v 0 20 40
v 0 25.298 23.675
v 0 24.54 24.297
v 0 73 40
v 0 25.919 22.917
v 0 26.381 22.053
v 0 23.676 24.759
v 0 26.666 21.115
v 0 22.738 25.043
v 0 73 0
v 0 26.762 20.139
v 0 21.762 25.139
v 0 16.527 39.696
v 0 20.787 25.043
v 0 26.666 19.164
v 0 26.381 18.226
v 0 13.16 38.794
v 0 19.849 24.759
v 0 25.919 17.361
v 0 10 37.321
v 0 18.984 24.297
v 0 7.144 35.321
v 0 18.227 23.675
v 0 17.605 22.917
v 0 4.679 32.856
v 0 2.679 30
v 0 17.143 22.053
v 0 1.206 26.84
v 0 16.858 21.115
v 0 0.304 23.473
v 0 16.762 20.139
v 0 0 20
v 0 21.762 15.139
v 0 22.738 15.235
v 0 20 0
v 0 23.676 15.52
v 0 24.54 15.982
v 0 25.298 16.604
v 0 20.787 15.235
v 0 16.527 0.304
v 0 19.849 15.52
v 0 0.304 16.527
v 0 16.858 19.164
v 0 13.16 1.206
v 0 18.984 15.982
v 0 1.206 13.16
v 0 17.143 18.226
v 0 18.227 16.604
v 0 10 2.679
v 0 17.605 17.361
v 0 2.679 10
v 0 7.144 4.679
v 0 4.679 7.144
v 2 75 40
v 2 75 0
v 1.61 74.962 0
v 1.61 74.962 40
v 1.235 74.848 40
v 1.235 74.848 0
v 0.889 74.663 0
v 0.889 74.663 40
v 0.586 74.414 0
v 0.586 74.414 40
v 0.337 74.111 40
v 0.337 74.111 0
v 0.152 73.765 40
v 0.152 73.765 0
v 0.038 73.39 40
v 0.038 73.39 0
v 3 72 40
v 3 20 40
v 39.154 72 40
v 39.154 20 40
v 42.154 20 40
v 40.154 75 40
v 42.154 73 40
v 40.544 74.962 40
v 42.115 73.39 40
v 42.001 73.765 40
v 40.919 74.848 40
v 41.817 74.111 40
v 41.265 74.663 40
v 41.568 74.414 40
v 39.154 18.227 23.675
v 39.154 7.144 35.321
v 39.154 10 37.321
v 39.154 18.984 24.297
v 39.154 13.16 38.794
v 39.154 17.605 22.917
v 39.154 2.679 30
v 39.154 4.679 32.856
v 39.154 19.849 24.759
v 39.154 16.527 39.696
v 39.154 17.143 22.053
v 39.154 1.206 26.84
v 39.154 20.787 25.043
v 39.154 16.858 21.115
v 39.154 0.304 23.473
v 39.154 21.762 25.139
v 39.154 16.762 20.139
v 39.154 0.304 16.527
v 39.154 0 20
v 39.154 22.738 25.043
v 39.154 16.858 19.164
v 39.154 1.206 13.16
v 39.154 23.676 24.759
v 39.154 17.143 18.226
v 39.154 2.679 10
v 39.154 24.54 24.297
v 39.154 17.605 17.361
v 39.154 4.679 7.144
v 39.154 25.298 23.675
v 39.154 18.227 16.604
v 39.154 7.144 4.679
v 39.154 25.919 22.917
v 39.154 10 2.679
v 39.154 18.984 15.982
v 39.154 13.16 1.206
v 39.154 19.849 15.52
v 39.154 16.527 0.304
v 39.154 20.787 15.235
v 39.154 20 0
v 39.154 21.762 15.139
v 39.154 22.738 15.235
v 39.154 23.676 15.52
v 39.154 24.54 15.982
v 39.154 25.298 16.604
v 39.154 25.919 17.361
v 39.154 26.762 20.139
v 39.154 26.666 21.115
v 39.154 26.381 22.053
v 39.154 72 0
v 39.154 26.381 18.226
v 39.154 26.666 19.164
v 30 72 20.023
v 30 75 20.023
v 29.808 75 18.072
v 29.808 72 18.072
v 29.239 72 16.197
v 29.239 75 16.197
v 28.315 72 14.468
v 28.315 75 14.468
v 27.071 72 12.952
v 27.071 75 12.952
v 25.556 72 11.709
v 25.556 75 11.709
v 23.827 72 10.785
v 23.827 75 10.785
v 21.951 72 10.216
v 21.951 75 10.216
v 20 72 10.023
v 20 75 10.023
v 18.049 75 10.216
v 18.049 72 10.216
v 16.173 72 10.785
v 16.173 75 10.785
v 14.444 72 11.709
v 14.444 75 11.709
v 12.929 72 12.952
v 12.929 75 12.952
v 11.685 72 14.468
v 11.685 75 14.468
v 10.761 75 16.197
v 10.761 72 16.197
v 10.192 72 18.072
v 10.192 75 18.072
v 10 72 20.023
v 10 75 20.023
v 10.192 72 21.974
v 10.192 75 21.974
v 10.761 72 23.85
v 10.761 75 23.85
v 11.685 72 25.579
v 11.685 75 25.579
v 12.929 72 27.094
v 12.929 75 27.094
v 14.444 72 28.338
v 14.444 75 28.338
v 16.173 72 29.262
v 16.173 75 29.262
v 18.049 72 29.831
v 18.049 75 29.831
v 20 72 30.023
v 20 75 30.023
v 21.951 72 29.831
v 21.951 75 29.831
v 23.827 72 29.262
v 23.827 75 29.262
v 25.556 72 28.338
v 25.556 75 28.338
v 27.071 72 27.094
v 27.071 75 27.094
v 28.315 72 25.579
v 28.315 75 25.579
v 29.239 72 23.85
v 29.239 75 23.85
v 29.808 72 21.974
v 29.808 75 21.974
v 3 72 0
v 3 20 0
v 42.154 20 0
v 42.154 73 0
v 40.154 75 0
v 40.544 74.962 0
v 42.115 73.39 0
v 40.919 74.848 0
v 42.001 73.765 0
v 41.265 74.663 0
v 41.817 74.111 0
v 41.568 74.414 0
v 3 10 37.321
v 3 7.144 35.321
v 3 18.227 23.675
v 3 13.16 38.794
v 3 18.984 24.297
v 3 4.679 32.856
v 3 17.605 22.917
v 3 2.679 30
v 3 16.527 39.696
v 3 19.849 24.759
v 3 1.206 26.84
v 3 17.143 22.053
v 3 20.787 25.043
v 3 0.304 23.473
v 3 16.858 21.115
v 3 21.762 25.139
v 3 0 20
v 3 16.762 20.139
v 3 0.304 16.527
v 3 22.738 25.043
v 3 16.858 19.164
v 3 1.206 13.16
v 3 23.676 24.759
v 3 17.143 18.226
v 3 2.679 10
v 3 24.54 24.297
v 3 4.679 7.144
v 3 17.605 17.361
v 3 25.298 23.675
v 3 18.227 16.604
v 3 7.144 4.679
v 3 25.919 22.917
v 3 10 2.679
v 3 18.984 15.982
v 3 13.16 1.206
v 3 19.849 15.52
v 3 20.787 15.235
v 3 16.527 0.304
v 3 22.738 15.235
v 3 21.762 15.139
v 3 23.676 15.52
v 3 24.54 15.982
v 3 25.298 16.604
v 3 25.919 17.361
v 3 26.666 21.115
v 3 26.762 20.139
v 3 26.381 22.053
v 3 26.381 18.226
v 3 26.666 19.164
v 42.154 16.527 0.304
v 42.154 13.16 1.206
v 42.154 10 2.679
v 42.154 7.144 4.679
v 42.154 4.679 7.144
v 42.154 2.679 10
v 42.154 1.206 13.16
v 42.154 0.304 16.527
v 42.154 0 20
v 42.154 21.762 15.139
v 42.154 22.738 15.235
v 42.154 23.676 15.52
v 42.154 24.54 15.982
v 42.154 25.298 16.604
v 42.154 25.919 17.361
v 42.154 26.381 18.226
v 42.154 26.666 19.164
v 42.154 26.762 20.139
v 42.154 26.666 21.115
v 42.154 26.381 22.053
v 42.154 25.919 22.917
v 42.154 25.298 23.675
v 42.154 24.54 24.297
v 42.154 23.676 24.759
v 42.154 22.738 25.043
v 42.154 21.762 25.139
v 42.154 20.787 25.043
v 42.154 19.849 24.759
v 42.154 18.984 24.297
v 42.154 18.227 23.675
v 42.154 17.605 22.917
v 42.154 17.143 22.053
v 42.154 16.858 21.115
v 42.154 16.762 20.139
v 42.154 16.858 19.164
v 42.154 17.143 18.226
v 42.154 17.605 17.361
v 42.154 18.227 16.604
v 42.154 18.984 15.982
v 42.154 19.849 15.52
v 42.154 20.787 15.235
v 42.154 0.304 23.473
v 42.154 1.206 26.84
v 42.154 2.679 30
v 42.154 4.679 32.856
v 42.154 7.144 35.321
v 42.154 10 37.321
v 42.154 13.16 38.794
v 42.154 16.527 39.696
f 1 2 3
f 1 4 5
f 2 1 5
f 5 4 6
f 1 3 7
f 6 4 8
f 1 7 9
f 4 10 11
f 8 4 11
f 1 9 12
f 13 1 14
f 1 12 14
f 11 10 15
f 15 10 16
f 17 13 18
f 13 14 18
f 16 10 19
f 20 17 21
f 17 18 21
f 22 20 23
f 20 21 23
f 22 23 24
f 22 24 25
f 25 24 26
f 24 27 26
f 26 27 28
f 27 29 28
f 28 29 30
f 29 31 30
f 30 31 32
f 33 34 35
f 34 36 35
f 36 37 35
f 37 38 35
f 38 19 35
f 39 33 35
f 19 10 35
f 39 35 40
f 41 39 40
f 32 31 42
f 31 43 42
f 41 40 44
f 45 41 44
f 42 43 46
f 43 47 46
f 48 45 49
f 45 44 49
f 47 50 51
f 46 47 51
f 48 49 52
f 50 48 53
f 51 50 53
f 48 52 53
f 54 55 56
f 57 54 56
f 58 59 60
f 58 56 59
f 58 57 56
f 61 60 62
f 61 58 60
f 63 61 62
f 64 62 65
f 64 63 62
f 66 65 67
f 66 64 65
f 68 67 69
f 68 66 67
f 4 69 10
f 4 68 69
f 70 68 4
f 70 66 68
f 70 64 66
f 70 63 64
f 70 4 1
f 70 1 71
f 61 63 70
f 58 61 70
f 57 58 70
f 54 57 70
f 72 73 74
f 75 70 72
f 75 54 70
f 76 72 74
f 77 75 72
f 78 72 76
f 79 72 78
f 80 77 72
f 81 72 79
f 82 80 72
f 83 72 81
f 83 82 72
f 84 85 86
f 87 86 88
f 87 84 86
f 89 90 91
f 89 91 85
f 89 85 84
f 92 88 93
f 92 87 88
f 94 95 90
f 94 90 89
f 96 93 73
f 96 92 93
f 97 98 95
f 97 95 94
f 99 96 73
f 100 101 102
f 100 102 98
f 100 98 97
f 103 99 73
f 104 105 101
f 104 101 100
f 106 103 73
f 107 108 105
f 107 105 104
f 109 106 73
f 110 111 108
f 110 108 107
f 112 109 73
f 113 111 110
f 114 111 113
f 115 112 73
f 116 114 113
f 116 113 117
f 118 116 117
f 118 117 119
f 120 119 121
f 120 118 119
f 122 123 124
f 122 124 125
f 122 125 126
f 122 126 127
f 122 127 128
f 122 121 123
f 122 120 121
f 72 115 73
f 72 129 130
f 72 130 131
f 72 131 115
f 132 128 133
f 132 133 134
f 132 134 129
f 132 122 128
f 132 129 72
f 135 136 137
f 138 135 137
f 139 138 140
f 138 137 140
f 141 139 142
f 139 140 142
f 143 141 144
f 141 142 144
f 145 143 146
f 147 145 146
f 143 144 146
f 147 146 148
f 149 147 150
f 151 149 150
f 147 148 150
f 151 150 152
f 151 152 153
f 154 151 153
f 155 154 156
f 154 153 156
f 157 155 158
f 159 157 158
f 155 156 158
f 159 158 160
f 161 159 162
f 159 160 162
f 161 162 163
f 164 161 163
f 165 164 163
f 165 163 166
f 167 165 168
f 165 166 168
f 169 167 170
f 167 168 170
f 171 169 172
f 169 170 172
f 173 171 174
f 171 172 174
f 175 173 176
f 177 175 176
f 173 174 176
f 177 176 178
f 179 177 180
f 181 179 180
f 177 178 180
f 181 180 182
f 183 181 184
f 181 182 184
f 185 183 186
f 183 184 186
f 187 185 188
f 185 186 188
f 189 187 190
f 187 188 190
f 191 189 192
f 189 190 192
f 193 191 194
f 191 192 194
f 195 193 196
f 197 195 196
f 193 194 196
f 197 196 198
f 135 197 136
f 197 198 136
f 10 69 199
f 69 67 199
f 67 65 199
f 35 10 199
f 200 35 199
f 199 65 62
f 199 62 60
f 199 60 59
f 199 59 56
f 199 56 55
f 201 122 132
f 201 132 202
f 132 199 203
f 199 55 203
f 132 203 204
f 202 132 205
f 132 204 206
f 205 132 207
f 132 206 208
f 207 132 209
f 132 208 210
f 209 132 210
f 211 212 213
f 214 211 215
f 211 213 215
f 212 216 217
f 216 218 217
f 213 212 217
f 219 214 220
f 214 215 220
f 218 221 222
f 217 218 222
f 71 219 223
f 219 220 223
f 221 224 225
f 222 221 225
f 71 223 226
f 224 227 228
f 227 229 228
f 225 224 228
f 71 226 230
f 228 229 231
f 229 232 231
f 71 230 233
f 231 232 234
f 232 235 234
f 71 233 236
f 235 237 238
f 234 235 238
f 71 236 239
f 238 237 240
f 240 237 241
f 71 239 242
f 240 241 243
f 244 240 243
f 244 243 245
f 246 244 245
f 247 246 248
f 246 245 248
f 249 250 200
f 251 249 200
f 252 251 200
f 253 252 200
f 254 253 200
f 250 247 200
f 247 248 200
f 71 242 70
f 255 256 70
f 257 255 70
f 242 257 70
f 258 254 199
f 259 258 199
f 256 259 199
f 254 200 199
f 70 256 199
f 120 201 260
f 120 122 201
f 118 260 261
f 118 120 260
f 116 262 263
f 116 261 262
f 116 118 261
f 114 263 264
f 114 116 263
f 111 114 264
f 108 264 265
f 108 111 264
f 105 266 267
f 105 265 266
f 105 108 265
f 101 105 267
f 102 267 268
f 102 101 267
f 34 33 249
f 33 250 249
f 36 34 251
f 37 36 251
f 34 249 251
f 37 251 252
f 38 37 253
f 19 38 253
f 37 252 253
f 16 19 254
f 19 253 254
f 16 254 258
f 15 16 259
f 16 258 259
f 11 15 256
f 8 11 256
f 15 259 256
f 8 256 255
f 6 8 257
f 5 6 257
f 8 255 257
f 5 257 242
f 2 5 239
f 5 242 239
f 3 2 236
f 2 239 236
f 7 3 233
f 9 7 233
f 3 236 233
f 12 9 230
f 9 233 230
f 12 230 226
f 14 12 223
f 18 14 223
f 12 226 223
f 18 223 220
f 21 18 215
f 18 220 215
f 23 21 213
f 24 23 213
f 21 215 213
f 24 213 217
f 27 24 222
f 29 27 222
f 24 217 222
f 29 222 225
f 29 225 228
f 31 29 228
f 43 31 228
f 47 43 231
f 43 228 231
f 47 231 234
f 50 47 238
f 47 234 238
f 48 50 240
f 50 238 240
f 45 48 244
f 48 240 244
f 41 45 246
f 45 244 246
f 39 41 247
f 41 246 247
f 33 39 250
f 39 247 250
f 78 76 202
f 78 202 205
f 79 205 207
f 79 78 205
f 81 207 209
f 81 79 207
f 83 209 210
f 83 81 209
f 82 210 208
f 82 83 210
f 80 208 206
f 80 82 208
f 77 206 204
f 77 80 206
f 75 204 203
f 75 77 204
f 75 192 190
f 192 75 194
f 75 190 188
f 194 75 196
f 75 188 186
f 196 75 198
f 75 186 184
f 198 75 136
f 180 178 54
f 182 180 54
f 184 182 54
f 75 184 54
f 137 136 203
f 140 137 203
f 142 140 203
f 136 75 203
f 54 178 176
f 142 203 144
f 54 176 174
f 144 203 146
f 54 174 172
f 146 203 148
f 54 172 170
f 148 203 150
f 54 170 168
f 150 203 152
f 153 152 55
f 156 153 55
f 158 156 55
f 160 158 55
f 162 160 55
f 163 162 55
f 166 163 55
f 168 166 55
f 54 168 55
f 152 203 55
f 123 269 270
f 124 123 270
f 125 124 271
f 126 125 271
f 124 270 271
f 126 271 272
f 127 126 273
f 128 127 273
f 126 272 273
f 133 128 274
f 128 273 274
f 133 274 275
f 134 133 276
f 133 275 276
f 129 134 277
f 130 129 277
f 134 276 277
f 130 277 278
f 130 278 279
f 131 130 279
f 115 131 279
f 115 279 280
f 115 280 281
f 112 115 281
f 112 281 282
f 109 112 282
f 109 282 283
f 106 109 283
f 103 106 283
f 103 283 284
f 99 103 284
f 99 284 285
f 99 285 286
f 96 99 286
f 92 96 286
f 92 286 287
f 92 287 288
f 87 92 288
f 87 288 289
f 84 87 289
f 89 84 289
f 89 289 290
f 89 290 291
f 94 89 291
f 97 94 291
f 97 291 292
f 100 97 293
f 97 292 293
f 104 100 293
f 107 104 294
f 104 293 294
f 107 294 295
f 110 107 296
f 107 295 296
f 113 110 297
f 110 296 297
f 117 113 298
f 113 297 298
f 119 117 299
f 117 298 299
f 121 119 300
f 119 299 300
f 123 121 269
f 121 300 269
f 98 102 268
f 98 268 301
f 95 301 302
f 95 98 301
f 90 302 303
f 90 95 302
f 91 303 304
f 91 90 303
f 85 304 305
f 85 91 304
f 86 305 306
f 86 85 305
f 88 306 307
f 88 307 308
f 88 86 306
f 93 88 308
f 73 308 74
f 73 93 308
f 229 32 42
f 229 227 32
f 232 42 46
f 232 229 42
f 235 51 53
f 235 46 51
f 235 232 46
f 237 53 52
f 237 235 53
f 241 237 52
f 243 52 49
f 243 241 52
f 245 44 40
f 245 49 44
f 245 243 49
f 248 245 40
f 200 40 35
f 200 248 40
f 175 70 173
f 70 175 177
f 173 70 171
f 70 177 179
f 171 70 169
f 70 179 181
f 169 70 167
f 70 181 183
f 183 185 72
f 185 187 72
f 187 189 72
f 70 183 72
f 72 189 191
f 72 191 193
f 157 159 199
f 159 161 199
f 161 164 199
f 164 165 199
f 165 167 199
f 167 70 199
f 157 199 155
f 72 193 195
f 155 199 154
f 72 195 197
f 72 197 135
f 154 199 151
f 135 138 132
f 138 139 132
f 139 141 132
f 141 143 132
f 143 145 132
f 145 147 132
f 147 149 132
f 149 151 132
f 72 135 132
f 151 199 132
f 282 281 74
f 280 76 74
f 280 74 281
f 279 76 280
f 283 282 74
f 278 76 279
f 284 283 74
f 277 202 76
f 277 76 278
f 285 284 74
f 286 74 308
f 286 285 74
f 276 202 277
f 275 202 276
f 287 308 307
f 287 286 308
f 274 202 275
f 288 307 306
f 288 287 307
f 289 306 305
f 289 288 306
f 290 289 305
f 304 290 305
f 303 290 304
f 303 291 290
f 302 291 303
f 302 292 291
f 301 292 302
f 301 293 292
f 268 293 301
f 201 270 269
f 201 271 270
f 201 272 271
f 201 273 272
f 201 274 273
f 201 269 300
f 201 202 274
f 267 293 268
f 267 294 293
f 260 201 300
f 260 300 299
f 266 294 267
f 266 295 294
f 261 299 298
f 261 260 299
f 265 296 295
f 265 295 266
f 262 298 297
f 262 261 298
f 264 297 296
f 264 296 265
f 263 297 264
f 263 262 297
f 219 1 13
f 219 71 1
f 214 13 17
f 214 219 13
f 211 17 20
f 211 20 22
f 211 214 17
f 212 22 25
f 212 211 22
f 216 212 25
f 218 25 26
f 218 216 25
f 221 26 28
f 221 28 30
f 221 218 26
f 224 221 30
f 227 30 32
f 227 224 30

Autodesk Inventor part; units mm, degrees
ref_plane "YZ Plane" through (0, 0, 0) normal (1, 0, 0) x (0, 1, 0)
ref_plane "XZ Plane" through (0, 0, 0) normal (0, 1, 0) x (-1, 0, 0)
ref_plane "XY Plane" through (0, 0, 0) normal (0, 0, 1) x (1, 0, 0)
sketch "Sketch1" plane through (0, 0, 0) normal (0, 0, 1) x (1, 0, 0)
  line L0 (0, 0) -> (3, 0)
  line L1 (3, 0) -> (3, 72)
  line L2 (3, 72) -> (39.1537, 72)
  line L3 (42.1537, 75) -> (0, 75)
  line L4 (0, 75) -> (0, 0)
  line L5 (42.1537, 75) -> (42.1537, 0)
  line L6 (42.1537, 0) -> (39.1537, 0)
  line L7 (39.1537, 0) -> (39.1537, 72)
  dimension "d0" = 75
  dimension "d1" = 3
  dimension "d3" = 3
extrude "Extrusion1" add sketch "Sketch1" along normal blind 40
fillet "Fillet1" radius 20 2 edges at (40.6537, 0, 40) (40.6537, 0, 0)
fillet "Fillet2" radius 20 2 edges at (1.5, 0, 40) (1.5, 0, 0)
sketch "Sketch2" plane through (42.1537, 75, 40) normal (1, 0, 0) x (0, 0, -1)
  circle A0 centre (19.8608, -53.2379) radius 5
  point P0 (40, -75)
  dimension "d8" = 10
extrude "Extrusion2" cut sketch "Sketch2" against normal blind 50
sketch "Sketch3" plane through (0, 75, 0) normal (0, 1, 0) x (1, 0, 0)
  circle A0 centre (20, -20.0234) radius 10
  line L0 (0, 0) -> (0, -40) projected
  dimension "d11" = 20
  dimension "d12" = 20
sketch "Sketch4" plane through (0, 75, 0) normal (0, 1, 0) x (1, 0, 0)
  point P0 (0, 0)
extrude "Extrusion3" cut sketch "Sketch3" against normal through all
fillet "Fillet3" radius 2 2 edges at (42.1537, 75, 20) (0, 75, 20)
sketch "Sketch5" plane through (2, 75, 0) normal (0, 1, 0) x (1, 0, 0)
  point P0 (-2, 0)
sketch "Sketch6" plane through (42.1537, 20, 20) normal (1, 0, 0) x (0, 0, -1)
  point P0 (20, -20)
properties part number "peca1" material "Steel, Carbon"
